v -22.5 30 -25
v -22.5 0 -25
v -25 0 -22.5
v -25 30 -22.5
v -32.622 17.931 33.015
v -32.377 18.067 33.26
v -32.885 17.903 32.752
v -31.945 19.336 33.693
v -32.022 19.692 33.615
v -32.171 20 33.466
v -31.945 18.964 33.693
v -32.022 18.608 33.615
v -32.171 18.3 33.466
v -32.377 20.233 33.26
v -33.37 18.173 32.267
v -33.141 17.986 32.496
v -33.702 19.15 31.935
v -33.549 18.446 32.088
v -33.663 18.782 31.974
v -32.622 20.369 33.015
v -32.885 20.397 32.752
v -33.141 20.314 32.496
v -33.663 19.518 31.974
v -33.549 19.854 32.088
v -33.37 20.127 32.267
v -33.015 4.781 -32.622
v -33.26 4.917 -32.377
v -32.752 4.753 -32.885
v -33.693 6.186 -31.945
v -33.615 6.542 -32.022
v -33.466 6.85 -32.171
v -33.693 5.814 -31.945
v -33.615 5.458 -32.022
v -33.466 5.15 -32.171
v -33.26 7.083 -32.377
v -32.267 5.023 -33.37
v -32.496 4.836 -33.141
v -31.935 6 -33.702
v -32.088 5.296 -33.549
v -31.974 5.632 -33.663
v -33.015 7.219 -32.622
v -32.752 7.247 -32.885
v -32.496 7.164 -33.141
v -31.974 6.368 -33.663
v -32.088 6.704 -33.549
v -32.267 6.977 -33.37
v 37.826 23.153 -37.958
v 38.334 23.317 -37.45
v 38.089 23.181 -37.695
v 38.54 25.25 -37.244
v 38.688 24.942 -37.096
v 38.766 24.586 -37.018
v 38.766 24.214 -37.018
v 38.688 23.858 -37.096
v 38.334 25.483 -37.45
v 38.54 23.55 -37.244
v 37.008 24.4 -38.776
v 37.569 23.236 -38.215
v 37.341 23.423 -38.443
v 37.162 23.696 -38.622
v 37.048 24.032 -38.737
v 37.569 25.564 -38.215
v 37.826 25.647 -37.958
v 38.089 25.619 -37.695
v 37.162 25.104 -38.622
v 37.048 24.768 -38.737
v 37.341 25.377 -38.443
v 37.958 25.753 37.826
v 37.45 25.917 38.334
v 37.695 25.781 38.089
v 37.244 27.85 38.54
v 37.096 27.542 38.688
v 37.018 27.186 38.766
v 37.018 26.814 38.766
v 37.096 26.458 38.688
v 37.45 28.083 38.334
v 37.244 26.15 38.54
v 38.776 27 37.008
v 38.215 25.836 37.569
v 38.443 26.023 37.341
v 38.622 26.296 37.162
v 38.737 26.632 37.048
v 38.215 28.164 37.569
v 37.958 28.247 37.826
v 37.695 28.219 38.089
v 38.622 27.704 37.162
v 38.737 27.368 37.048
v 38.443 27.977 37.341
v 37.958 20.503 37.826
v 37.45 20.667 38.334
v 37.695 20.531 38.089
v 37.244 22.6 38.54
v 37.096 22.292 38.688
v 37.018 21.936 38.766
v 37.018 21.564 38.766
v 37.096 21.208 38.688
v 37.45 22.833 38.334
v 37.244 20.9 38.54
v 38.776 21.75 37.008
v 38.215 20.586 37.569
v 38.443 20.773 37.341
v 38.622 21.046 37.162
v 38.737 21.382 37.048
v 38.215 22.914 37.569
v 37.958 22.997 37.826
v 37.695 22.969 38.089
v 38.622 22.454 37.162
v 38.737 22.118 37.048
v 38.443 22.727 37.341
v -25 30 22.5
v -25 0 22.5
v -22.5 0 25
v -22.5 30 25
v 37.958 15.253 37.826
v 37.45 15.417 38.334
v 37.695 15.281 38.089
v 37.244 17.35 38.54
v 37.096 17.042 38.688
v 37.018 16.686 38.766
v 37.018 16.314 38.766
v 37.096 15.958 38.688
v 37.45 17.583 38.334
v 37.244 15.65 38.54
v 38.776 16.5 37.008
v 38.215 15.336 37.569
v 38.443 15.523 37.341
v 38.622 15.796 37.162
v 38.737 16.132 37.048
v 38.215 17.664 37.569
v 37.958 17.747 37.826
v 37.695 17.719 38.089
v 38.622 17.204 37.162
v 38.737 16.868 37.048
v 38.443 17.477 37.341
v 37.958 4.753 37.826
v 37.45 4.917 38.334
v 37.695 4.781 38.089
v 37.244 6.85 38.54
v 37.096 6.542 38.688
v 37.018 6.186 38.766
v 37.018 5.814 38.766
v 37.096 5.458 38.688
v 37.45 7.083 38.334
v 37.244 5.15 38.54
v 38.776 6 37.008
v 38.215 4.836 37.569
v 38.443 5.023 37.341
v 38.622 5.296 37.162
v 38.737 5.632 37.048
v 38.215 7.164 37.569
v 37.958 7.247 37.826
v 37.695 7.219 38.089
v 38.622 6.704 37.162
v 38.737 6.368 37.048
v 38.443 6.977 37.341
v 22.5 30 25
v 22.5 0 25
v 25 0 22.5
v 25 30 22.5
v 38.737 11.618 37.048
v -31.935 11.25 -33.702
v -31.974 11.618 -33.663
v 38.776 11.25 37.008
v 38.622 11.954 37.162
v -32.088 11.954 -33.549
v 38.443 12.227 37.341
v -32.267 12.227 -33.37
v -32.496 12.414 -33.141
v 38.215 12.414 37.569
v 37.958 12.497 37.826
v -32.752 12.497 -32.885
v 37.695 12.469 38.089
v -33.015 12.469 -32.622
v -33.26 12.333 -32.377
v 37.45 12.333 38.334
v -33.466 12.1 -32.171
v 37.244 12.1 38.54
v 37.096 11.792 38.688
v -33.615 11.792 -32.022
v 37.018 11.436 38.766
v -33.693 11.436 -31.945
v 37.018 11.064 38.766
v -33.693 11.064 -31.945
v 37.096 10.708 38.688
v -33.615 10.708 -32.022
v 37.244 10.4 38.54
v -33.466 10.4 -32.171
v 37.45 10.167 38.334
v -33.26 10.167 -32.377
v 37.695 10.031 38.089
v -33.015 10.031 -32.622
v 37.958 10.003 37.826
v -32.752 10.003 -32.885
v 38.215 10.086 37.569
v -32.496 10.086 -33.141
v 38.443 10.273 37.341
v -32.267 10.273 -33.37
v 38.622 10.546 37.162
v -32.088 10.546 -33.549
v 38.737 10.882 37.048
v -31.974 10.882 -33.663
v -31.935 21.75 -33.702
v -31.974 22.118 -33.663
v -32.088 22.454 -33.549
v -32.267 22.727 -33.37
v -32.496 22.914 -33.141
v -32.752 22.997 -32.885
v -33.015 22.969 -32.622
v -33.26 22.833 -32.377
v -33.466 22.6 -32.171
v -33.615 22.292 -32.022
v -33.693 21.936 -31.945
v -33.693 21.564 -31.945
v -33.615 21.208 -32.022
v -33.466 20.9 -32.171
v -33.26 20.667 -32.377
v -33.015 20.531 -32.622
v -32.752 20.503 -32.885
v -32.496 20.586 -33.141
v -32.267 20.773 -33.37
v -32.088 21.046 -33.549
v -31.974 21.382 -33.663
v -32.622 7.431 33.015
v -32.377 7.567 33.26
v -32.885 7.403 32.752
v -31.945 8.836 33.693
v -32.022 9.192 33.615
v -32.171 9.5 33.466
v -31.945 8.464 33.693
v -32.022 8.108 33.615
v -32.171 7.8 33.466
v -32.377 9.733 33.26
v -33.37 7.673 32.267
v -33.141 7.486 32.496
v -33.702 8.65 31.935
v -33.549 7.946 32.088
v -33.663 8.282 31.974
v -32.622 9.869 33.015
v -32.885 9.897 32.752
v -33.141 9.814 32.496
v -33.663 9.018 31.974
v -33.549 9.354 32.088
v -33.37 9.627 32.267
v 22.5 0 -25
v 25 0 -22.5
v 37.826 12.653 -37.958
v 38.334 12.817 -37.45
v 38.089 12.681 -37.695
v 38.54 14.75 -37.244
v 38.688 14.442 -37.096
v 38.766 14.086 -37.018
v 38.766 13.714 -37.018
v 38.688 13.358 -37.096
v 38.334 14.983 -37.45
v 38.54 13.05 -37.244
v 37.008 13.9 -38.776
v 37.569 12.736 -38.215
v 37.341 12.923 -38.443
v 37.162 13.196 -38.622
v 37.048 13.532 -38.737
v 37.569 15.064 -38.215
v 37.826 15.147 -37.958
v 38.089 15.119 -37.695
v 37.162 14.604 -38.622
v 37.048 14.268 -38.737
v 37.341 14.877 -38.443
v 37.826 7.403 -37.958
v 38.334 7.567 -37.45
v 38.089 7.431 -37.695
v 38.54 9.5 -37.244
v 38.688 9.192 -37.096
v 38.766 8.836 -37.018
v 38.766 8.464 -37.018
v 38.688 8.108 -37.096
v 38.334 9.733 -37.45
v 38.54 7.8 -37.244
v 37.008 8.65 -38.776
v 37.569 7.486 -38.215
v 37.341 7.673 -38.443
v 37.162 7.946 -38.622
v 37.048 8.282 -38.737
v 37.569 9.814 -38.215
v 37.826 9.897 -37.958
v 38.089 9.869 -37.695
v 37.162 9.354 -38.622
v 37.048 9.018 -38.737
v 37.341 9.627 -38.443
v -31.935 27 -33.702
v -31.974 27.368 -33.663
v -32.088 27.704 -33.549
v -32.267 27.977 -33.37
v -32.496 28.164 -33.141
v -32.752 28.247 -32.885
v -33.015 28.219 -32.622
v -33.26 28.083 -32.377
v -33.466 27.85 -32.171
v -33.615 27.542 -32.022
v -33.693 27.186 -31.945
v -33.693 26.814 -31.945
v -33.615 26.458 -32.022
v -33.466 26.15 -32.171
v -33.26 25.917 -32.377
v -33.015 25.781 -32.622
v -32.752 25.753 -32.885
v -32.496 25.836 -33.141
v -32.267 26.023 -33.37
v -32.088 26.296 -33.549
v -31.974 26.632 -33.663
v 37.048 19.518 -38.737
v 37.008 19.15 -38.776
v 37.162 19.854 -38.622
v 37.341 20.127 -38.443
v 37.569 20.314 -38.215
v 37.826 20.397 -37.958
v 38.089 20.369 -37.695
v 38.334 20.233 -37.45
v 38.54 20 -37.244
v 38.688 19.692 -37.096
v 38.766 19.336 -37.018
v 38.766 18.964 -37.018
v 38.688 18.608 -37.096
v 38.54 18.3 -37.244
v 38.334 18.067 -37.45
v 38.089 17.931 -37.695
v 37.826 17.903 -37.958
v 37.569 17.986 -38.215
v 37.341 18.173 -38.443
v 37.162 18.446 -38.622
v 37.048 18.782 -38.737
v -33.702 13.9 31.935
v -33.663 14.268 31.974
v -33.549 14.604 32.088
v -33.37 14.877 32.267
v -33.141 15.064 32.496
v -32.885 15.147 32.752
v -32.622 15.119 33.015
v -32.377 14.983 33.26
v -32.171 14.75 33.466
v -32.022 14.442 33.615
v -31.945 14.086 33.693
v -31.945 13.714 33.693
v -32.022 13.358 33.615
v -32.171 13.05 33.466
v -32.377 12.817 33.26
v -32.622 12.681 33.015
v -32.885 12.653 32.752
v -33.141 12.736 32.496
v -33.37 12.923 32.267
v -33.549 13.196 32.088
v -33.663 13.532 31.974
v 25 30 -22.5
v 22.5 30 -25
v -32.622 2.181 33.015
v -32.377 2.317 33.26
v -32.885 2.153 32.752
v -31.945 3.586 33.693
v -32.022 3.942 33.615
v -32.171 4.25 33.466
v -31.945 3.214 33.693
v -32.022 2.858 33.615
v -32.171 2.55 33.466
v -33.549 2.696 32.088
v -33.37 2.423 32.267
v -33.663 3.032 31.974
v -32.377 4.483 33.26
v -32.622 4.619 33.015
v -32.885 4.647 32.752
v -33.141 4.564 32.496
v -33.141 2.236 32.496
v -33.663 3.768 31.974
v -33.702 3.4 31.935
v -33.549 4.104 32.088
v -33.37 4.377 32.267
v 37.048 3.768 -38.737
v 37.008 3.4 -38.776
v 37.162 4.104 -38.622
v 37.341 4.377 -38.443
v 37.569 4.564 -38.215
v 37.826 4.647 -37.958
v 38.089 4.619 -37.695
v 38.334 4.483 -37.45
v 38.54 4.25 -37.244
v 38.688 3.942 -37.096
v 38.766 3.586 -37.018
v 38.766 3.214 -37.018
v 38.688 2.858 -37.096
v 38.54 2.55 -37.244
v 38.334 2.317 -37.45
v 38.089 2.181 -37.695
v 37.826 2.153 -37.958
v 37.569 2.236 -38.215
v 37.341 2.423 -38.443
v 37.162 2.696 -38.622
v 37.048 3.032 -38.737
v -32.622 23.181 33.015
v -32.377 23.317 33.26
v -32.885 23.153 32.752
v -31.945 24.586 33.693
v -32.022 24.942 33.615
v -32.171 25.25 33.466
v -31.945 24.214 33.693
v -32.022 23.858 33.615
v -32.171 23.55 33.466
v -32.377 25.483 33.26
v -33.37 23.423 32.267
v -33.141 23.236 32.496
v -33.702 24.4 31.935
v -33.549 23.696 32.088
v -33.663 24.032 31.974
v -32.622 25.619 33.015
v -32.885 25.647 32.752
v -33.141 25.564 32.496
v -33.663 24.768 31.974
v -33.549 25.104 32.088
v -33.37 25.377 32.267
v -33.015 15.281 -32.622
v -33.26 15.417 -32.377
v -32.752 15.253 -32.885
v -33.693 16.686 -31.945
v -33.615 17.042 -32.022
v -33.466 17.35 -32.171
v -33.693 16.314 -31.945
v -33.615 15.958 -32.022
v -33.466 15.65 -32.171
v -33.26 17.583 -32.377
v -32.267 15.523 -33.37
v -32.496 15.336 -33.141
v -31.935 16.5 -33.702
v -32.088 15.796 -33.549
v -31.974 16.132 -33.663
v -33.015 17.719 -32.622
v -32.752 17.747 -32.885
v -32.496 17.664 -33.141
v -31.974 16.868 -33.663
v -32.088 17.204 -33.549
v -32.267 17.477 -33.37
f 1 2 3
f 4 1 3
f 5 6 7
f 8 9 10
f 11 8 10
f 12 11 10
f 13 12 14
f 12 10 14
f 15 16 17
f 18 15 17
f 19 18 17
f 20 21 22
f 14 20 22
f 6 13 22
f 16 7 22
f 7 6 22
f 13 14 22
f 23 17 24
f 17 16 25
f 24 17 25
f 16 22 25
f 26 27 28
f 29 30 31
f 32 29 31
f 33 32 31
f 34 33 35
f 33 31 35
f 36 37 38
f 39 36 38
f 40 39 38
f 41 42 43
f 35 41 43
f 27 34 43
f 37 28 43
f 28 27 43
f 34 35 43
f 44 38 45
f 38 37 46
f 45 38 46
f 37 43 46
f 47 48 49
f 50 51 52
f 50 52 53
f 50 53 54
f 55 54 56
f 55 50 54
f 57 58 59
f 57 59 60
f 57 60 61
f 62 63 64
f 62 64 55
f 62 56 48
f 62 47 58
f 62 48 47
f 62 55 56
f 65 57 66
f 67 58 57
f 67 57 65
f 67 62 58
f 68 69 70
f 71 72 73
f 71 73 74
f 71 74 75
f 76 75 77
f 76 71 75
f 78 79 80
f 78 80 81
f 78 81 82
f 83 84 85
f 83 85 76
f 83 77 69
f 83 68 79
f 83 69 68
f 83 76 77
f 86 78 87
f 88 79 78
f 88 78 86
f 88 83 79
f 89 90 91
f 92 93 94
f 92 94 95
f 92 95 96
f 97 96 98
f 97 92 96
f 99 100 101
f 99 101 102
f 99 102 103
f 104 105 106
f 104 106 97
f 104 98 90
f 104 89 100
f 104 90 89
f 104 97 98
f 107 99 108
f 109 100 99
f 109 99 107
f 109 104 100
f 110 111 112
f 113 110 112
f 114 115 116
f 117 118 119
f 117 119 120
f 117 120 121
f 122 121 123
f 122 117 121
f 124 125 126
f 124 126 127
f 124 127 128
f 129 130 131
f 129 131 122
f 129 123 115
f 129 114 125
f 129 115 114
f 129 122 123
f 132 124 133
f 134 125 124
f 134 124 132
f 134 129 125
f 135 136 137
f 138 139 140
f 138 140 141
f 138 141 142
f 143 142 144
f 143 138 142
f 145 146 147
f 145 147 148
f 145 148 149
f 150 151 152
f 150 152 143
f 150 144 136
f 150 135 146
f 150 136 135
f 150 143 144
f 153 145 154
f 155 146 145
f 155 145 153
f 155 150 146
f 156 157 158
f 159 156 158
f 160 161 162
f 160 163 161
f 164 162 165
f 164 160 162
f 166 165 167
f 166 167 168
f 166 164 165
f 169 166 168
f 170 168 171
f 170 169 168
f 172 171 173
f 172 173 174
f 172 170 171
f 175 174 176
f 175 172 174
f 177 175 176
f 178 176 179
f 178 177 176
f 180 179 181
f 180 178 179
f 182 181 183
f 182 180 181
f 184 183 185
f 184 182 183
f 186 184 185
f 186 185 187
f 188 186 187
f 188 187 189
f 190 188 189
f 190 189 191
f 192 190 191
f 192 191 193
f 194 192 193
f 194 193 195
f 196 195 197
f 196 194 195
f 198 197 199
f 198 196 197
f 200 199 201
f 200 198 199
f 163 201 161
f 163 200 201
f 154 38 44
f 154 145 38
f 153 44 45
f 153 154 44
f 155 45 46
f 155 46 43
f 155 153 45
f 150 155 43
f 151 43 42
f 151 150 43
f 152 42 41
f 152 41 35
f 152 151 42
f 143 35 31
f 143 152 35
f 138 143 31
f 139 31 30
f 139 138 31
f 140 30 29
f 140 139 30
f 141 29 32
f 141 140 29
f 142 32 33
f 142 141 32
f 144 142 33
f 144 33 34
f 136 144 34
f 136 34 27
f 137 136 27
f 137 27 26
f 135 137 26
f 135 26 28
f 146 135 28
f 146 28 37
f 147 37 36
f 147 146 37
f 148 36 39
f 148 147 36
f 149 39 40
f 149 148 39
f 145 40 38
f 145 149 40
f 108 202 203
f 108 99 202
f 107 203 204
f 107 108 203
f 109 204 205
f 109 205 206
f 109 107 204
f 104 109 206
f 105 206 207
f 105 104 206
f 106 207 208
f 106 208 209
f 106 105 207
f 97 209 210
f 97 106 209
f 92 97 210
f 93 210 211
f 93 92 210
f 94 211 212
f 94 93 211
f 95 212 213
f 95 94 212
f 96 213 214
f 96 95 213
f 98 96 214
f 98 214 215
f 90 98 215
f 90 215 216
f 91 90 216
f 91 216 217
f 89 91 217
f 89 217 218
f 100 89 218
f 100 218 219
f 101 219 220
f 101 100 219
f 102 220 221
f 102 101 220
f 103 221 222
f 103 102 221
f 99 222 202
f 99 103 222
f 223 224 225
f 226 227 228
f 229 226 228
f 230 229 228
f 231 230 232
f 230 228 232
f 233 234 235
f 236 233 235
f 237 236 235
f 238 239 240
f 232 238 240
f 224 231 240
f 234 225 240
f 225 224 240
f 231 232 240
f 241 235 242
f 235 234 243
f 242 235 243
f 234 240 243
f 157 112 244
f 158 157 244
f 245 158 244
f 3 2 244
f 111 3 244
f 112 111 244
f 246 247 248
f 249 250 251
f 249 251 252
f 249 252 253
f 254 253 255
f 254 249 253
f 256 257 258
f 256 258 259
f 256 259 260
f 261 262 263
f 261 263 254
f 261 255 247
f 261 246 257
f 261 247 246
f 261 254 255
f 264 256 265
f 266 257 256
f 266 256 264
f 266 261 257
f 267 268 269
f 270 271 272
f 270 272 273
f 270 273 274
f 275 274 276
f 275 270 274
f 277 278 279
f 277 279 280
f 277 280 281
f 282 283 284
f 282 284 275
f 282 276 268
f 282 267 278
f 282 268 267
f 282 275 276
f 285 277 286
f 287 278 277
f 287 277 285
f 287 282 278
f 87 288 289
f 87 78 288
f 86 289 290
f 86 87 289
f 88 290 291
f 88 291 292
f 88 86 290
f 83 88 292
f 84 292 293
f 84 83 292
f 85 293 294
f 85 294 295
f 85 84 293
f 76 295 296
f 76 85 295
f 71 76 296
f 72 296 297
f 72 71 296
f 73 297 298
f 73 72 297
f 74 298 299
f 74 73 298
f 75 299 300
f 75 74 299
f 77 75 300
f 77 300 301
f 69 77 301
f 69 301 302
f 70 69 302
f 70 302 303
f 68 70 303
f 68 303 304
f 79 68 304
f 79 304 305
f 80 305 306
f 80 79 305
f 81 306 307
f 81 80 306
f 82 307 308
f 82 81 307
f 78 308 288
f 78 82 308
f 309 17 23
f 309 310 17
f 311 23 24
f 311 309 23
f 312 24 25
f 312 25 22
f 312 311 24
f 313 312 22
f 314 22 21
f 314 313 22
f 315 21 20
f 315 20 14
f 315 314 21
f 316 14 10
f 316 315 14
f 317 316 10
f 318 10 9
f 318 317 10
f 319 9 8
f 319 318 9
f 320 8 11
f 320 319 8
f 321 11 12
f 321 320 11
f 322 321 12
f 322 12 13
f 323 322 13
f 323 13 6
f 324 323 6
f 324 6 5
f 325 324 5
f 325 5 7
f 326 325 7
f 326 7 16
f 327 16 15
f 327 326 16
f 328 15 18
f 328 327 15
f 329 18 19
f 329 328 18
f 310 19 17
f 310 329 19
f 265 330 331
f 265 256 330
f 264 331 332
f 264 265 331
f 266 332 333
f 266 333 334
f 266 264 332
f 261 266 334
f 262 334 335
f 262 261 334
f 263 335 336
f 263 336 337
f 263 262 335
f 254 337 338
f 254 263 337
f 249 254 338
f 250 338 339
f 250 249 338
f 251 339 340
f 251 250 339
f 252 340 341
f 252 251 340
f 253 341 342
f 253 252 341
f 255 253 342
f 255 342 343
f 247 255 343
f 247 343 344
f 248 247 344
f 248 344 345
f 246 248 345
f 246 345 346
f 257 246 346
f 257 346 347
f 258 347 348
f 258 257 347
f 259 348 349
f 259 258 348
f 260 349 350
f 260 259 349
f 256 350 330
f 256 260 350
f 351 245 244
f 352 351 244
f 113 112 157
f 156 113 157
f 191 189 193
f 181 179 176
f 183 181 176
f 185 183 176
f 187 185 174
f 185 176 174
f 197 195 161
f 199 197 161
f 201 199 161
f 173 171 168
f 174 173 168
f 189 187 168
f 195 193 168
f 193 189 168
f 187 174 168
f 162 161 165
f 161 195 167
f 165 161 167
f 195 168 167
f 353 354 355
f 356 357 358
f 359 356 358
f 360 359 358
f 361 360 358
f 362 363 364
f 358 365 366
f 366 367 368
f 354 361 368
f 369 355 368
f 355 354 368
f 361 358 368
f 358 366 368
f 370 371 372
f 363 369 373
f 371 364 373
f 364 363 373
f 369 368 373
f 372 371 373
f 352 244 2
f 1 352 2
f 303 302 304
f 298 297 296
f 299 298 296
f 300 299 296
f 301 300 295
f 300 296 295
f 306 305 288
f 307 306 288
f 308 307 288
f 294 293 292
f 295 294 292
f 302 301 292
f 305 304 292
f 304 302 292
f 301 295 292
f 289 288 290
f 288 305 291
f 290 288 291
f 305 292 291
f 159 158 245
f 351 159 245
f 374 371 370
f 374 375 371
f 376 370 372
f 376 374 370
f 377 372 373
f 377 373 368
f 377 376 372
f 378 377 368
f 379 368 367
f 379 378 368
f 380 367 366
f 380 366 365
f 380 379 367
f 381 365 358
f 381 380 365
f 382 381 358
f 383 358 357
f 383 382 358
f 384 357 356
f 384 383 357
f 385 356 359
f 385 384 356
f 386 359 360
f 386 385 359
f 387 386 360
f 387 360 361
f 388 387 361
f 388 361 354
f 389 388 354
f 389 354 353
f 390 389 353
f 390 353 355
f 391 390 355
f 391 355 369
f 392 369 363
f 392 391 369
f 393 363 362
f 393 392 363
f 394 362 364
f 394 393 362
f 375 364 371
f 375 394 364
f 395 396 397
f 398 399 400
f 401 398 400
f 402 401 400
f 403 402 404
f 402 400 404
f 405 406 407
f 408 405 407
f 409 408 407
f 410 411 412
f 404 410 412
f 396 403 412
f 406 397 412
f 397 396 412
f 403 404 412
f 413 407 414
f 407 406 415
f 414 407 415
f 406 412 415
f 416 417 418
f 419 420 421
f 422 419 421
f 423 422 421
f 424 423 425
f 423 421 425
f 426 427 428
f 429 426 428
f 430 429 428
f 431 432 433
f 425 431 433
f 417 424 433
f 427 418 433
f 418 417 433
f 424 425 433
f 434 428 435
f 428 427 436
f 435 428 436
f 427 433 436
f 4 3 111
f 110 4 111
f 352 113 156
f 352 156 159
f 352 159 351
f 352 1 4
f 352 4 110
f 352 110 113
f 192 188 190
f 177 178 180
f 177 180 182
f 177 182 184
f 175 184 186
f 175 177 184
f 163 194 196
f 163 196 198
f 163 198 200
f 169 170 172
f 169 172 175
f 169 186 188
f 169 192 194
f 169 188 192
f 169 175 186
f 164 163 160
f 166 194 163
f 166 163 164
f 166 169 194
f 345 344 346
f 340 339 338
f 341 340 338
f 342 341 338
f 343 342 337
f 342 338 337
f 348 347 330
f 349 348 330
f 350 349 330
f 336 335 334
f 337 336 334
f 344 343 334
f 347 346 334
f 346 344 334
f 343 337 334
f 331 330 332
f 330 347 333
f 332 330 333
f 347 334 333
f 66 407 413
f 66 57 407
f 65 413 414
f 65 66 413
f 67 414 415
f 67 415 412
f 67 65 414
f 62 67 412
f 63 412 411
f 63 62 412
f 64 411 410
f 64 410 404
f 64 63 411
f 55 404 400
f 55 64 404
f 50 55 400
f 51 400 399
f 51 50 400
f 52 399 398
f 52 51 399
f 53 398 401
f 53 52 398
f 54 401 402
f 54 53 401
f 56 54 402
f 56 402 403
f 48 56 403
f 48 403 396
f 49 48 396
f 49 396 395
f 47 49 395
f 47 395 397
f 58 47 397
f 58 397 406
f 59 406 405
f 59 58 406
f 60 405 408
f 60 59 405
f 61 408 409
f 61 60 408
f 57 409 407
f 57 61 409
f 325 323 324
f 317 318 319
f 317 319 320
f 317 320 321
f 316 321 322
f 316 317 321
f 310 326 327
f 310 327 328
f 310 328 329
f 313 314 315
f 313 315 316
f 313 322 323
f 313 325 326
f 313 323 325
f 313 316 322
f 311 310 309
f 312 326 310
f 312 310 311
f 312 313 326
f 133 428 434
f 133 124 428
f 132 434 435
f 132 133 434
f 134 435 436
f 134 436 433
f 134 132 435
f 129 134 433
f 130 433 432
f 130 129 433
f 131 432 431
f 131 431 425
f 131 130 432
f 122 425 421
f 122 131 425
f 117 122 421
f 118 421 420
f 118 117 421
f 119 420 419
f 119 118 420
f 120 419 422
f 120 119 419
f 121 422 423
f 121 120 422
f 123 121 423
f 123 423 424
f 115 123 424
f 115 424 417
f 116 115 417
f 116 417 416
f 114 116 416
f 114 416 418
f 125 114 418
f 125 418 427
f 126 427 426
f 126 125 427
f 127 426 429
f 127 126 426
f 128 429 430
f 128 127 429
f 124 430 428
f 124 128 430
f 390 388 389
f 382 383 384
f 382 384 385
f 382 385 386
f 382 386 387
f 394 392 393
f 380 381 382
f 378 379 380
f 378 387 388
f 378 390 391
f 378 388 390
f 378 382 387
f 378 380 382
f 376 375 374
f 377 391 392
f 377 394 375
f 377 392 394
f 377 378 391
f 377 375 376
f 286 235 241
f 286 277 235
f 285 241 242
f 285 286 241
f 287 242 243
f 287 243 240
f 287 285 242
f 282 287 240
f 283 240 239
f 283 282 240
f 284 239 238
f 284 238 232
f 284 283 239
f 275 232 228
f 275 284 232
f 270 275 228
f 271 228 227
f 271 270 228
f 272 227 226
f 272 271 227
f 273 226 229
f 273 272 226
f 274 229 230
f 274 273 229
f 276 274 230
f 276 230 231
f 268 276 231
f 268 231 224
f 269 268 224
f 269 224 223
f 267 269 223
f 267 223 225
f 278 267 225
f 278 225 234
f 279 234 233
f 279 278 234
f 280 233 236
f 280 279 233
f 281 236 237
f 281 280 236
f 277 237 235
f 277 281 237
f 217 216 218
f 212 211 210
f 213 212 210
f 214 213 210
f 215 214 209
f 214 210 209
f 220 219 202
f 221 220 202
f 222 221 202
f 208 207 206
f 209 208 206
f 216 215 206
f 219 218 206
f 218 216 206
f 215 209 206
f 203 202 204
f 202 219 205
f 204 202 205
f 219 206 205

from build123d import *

# Parameters (mm, degrees)
BOSS_EXTRUDE1_DEPTH        = 30
SKETCH2_R                  = 1.25
BOSS_EXTRUDE2_DEPTH        = 20
BOSS_EXTRUDE2_DEPTH_BACK   = 80
BOSS_EXTRUDE2_2_DEPTH      = 20
BOSS_EXTRUDE2_2_DEPTH_BACK = 80
BOSS_EXTRUDE2_3_DEPTH      = 20
BOSS_EXTRUDE2_3_DEPTH_BACK = 80
BOSS_EXTRUDE2_4_DEPTH      = 20
BOSS_EXTRUDE2_4_DEPTH_BACK = 80
BOSS_EXTRUDE2_5_DEPTH      = 20
BOSS_EXTRUDE2_5_DEPTH_BACK = 80
SKETCH3_R                  = 1.25
BOSS_EXTRUDE3_DEPTH        = 20
BOSS_EXTRUDE3_DEPTH_BACK   = 80
BOSS_EXTRUDE3_2_DEPTH      = 20
BOSS_EXTRUDE3_2_DEPTH_BACK = 80
BOSS_EXTRUDE3_3_DEPTH      = 20
BOSS_EXTRUDE3_3_DEPTH_BACK = 80
BOSS_EXTRUDE3_4_DEPTH      = 20
BOSS_EXTRUDE3_4_DEPTH_BACK = 80
BOSS_EXTRUDE3_5_DEPTH      = 20
BOSS_EXTRUDE3_5_DEPTH_BACK = 80


with BuildPart() as part:
    # Sketch1 → Boss-Extrude1 (new body)
    with BuildSketch(Plane(origin=(0, 0, 0), x_dir=(1, 0, 0), z_dir=(0, 1, 0))):
        Polygon((-22.5, -25), (22.5, -25), (25, -22.5), (25, 22.5), (22.5, 25), (-22.5, 25), (-25, 22.5), (-25, -22.5), align=None)
    extrude(amount=BOSS_EXTRUDE1_DEPTH)


with BuildPart() as body_2:
    # Sketch2 → Boss-Extrude2 (new body, two sides)
    with BuildSketch(Plane(origin=(23.75, 0, 23.75), x_dir=(0.707106781, 0, -0.707106781), z_dir=(0.707106781, 0, 0.707106781))) as boss_extrude2_sk:
        with Locations((0, 27)):
            Circle(SKETCH2_R)
    extrude(amount=BOSS_EXTRUDE2_DEPTH)
    extrude(boss_extrude2_sk.sketch, amount=-BOSS_EXTRUDE2_DEPTH_BACK)


with BuildPart() as body_3:
    # Sketch2 → Boss-Extrude2 2 (new body, two sides)
    with BuildSketch(Plane(origin=(23.75, 0, 23.75), x_dir=(0.707106781, 0, -0.707106781), z_dir=(0.707106781, 0, 0.707106781))) as boss_extrude2_2_sk:
        with Locations((0, 21.75)):
            Circle(SKETCH2_R)
    extrude(amount=BOSS_EXTRUDE2_2_DEPTH)
    extrude(boss_extrude2_2_sk.sketch, amount=-BOSS_EXTRUDE2_2_DEPTH_BACK)


with BuildPart() as body_4:
    # Sketch2 → Boss-Extrude2 3 (new body, two sides)
    with BuildSketch(Plane(origin=(23.75, 0, 23.75), x_dir=(0.707106781, 0, -0.707106781), z_dir=(0.707106781, 0, 0.707106781))) as boss_extrude2_3_sk:
        with Locations((0, 16.5)):
            Circle(SKETCH2_R)
    extrude(amount=BOSS_EXTRUDE2_3_DEPTH)
    extrude(boss_extrude2_3_sk.sketch, amount=-BOSS_EXTRUDE2_3_DEPTH_BACK)


with BuildPart() as body_5:
    # Sketch2 → Boss-Extrude2 4 (new body, two sides)
    with BuildSketch(Plane(origin=(23.75, 0, 23.75), x_dir=(0.707106781, 0, -0.707106781), z_dir=(0.707106781, 0, 0.707106781))) as boss_extrude2_4_sk:
        with Locations((0, 11.25)):
            Circle(SKETCH2_R)
    extrude(amount=BOSS_EXTRUDE2_4_DEPTH)
    extrude(boss_extrude2_4_sk.sketch, amount=-BOSS_EXTRUDE2_4_DEPTH_BACK)


with BuildPart() as body_6:
    # Sketch2 → Boss-Extrude2 5 (new body, two sides)
    with BuildSketch(Plane(origin=(23.75, 0, 23.75), x_dir=(0.707106781, 0, -0.707106781), z_dir=(0.707106781, 0, 0.707106781))) as boss_extrude2_5_sk:
        with Locations((0, 6)):
            Circle(SKETCH2_R)
    extrude(amount=BOSS_EXTRUDE2_5_DEPTH)
    extrude(boss_extrude2_5_sk.sketch, amount=-BOSS_EXTRUDE2_5_DEPTH_BACK)


with BuildPart() as body_7:
    # Sketch3 → Boss-Extrude3 (new body, two sides)
    with BuildSketch(Plane(origin=(23.75, 0, -23.75), x_dir=(-0.707106781, 0, -0.707106781), z_dir=(0.707106781, 0, -0.707106781))) as boss_extrude3_sk:
        with Locations((0, 24.4)):
            Circle(SKETCH3_R)
    extrude(amount=BOSS_EXTRUDE3_DEPTH)
    extrude(boss_extrude3_sk.sketch, amount=-BOSS_EXTRUDE3_DEPTH_BACK)


with BuildPart() as body_8:
    # Sketch3 → Boss-Extrude3 2 (new body, two sides)
    with BuildSketch(Plane(origin=(23.75, 0, -23.75), x_dir=(-0.707106781, 0, -0.707106781), z_dir=(0.707106781, 0, -0.707106781))) as boss_extrude3_2_sk:
        with Locations((0, 19.15)):
            Circle(SKETCH3_R)
    extrude(amount=BOSS_EXTRUDE3_2_DEPTH)
    extrude(boss_extrude3_2_sk.sketch, amount=-BOSS_EXTRUDE3_2_DEPTH_BACK)


with BuildPart() as body_9:
    # Sketch3 → Boss-Extrude3 3 (new body, two sides)
    with BuildSketch(Plane(origin=(23.75, 0, -23.75), x_dir=(-0.707106781, 0, -0.707106781), z_dir=(0.707106781, 0, -0.707106781))) as boss_extrude3_3_sk:
        with Locations((0, 13.9)):
            Circle(SKETCH3_R)
    extrude(amount=BOSS_EXTRUDE3_3_DEPTH)
    extrude(boss_extrude3_3_sk.sketch, amount=-BOSS_EXTRUDE3_3_DEPTH_BACK)


with BuildPart() as body_10:
    # Sketch3 → Boss-Extrude3 4 (new body, two sides)
    with BuildSketch(Plane(origin=(23.75, 0, -23.75), x_dir=(-0.707106781, 0, -0.707106781), z_dir=(0.707106781, 0, -0.707106781))) as boss_extrude3_4_sk:
        with Locations((0, 8.65)):
            Circle(SKETCH3_R)
    extrude(amount=BOSS_EXTRUDE3_4_DEPTH)
    extrude(boss_extrude3_4_sk.sketch, amount=-BOSS_EXTRUDE3_4_DEPTH_BACK)


with BuildPart() as body_11:
    # Sketch3 → Boss-Extrude3 5 (new body, two sides)
    with BuildSketch(Plane(origin=(23.75, 0, -23.75), x_dir=(-0.707106781, 0, -0.707106781), z_dir=(0.707106781, 0, -0.707106781))) as boss_extrude3_5_sk:
        with Locations((0, 3.4)):
            Circle(SKETCH3_R)
    extrude(amount=BOSS_EXTRUDE3_5_DEPTH)
    extrude(boss_extrude3_5_sk.sketch, amount=-BOSS_EXTRUDE3_5_DEPTH_BACK)


solid = Compound([part.part, body_2.part, body_3.part, body_4.part, body_5.part, body_6.part, body_7.part, body_8.part, body_9.part, body_10.part, body_11.part])
